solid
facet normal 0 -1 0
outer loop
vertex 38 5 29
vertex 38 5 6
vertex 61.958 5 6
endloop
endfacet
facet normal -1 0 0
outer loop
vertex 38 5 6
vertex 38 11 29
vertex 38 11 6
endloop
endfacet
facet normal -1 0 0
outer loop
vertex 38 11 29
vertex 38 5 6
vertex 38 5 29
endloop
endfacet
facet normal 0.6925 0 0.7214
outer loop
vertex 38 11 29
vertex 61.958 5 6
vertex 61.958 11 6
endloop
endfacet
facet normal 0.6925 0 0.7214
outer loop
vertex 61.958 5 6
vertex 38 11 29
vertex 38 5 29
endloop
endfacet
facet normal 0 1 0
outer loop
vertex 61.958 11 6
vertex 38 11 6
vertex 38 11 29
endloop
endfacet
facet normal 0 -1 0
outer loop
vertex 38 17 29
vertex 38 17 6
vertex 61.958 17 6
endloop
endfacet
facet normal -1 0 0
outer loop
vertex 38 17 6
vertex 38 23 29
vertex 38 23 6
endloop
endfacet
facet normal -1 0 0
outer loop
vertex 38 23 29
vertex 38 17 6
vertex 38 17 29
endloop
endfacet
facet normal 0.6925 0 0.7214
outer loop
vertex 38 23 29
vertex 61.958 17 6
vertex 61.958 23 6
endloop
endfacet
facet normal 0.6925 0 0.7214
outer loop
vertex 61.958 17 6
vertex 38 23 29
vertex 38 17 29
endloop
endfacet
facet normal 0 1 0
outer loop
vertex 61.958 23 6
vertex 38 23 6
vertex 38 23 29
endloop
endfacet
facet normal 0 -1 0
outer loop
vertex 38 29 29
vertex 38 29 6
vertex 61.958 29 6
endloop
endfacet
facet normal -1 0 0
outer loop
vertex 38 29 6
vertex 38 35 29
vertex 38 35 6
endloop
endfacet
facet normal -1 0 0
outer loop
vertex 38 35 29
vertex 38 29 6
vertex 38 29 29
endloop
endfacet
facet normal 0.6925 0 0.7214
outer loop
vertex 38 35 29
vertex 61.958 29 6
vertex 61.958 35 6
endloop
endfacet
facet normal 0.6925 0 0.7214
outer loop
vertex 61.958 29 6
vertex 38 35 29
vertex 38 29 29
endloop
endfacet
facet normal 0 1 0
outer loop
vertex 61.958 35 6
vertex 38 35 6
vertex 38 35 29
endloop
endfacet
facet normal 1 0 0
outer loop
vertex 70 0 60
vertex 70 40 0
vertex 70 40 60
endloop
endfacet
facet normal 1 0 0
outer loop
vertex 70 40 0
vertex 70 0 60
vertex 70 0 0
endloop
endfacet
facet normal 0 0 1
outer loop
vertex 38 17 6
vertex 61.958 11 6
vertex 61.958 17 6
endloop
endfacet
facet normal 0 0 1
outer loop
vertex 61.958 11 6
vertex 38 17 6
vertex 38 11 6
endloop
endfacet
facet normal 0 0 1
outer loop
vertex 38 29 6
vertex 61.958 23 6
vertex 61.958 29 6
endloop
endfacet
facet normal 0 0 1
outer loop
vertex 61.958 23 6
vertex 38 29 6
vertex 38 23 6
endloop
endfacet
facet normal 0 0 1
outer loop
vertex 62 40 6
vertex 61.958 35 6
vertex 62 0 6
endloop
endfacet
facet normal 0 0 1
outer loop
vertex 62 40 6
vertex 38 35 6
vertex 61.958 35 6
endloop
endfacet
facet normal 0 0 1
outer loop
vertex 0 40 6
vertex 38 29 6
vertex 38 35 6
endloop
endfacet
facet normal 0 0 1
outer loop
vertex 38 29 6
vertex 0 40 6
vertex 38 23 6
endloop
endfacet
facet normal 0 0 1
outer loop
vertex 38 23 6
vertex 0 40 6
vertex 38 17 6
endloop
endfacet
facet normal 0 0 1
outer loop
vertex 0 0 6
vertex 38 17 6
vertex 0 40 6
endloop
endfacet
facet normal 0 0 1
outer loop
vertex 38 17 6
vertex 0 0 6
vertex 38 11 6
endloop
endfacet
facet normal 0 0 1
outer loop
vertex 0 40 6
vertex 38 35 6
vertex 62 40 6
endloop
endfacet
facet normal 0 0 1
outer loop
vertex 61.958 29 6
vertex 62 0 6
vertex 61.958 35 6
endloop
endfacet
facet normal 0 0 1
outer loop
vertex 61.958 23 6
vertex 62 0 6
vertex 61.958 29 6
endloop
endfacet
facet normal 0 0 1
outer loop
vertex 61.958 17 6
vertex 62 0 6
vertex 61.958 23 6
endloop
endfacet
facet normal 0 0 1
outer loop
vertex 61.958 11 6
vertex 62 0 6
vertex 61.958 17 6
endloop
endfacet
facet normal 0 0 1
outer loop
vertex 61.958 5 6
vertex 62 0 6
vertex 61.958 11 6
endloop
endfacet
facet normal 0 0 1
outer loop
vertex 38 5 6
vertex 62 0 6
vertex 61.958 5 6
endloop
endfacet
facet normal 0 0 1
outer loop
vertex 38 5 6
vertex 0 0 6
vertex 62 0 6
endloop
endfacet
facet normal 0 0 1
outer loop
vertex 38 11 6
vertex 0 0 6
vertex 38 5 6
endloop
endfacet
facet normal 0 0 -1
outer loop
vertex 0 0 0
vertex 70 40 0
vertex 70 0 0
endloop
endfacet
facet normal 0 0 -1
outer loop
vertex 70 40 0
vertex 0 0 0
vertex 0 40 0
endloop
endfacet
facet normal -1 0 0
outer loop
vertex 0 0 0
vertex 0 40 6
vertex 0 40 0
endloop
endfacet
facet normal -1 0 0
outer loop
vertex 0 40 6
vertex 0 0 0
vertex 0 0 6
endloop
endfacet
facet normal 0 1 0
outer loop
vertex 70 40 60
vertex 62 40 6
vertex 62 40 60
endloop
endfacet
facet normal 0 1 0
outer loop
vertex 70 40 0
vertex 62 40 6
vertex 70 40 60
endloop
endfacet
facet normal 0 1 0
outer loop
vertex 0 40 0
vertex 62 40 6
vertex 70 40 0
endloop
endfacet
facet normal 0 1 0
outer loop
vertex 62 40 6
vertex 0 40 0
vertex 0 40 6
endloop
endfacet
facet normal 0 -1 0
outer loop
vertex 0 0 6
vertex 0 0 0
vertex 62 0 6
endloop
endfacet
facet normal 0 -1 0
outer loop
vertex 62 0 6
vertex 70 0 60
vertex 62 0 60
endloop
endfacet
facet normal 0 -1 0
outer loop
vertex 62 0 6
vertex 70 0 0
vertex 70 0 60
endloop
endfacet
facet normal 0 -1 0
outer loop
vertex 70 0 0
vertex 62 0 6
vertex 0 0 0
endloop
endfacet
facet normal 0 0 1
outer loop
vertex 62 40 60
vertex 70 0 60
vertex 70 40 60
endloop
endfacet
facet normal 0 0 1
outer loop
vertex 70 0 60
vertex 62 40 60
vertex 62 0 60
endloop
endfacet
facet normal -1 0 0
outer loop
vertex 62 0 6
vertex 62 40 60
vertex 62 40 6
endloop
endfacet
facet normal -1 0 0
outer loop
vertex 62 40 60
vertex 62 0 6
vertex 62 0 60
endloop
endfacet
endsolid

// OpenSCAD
$fn = 32;

// ----------------------------------------------------------------------
// Rib bracket: 3-gusset L bracket
// ----------------------------------------------------------------------

// --- parameters (mm) ---
base_l = 70;              // foot length, X
base_w = 40;              // foot width, Y
base_t = 6;               // foot thickness
plate_t = 8;              // upright plate thickness
plate_h = 60;             // overall height
gus_l = 24;               // gusset leg along the foot
gus_h = 24;               // gusset height
gus_t = 6;                // gusset thickness
gus_edge = 5;             // gusset margin from the foot edge
n_gus = 3;                // gusset count

gus_pitch = (base_w - 2 * gus_edge - gus_t) / (n_gus - 1);  // gusset pitch

union() {
  cube([base_l, base_w, base_t]);
  translate([base_l - plate_t, 0, base_t - 1])
    cube([plate_t, base_w, plate_h - base_t + 1]);
  for (i = [0 : n_gus - 1])
    translate([base_l - plate_t - gus_l, gus_edge + i * gus_pitch, base_t - 1])
      rotate([-90, 0, 0])
        linear_extrude(height = gus_t)
          polygon(points = [[0, 0], [gus_l + 1, 0], [0, -gus_h]]);
}
